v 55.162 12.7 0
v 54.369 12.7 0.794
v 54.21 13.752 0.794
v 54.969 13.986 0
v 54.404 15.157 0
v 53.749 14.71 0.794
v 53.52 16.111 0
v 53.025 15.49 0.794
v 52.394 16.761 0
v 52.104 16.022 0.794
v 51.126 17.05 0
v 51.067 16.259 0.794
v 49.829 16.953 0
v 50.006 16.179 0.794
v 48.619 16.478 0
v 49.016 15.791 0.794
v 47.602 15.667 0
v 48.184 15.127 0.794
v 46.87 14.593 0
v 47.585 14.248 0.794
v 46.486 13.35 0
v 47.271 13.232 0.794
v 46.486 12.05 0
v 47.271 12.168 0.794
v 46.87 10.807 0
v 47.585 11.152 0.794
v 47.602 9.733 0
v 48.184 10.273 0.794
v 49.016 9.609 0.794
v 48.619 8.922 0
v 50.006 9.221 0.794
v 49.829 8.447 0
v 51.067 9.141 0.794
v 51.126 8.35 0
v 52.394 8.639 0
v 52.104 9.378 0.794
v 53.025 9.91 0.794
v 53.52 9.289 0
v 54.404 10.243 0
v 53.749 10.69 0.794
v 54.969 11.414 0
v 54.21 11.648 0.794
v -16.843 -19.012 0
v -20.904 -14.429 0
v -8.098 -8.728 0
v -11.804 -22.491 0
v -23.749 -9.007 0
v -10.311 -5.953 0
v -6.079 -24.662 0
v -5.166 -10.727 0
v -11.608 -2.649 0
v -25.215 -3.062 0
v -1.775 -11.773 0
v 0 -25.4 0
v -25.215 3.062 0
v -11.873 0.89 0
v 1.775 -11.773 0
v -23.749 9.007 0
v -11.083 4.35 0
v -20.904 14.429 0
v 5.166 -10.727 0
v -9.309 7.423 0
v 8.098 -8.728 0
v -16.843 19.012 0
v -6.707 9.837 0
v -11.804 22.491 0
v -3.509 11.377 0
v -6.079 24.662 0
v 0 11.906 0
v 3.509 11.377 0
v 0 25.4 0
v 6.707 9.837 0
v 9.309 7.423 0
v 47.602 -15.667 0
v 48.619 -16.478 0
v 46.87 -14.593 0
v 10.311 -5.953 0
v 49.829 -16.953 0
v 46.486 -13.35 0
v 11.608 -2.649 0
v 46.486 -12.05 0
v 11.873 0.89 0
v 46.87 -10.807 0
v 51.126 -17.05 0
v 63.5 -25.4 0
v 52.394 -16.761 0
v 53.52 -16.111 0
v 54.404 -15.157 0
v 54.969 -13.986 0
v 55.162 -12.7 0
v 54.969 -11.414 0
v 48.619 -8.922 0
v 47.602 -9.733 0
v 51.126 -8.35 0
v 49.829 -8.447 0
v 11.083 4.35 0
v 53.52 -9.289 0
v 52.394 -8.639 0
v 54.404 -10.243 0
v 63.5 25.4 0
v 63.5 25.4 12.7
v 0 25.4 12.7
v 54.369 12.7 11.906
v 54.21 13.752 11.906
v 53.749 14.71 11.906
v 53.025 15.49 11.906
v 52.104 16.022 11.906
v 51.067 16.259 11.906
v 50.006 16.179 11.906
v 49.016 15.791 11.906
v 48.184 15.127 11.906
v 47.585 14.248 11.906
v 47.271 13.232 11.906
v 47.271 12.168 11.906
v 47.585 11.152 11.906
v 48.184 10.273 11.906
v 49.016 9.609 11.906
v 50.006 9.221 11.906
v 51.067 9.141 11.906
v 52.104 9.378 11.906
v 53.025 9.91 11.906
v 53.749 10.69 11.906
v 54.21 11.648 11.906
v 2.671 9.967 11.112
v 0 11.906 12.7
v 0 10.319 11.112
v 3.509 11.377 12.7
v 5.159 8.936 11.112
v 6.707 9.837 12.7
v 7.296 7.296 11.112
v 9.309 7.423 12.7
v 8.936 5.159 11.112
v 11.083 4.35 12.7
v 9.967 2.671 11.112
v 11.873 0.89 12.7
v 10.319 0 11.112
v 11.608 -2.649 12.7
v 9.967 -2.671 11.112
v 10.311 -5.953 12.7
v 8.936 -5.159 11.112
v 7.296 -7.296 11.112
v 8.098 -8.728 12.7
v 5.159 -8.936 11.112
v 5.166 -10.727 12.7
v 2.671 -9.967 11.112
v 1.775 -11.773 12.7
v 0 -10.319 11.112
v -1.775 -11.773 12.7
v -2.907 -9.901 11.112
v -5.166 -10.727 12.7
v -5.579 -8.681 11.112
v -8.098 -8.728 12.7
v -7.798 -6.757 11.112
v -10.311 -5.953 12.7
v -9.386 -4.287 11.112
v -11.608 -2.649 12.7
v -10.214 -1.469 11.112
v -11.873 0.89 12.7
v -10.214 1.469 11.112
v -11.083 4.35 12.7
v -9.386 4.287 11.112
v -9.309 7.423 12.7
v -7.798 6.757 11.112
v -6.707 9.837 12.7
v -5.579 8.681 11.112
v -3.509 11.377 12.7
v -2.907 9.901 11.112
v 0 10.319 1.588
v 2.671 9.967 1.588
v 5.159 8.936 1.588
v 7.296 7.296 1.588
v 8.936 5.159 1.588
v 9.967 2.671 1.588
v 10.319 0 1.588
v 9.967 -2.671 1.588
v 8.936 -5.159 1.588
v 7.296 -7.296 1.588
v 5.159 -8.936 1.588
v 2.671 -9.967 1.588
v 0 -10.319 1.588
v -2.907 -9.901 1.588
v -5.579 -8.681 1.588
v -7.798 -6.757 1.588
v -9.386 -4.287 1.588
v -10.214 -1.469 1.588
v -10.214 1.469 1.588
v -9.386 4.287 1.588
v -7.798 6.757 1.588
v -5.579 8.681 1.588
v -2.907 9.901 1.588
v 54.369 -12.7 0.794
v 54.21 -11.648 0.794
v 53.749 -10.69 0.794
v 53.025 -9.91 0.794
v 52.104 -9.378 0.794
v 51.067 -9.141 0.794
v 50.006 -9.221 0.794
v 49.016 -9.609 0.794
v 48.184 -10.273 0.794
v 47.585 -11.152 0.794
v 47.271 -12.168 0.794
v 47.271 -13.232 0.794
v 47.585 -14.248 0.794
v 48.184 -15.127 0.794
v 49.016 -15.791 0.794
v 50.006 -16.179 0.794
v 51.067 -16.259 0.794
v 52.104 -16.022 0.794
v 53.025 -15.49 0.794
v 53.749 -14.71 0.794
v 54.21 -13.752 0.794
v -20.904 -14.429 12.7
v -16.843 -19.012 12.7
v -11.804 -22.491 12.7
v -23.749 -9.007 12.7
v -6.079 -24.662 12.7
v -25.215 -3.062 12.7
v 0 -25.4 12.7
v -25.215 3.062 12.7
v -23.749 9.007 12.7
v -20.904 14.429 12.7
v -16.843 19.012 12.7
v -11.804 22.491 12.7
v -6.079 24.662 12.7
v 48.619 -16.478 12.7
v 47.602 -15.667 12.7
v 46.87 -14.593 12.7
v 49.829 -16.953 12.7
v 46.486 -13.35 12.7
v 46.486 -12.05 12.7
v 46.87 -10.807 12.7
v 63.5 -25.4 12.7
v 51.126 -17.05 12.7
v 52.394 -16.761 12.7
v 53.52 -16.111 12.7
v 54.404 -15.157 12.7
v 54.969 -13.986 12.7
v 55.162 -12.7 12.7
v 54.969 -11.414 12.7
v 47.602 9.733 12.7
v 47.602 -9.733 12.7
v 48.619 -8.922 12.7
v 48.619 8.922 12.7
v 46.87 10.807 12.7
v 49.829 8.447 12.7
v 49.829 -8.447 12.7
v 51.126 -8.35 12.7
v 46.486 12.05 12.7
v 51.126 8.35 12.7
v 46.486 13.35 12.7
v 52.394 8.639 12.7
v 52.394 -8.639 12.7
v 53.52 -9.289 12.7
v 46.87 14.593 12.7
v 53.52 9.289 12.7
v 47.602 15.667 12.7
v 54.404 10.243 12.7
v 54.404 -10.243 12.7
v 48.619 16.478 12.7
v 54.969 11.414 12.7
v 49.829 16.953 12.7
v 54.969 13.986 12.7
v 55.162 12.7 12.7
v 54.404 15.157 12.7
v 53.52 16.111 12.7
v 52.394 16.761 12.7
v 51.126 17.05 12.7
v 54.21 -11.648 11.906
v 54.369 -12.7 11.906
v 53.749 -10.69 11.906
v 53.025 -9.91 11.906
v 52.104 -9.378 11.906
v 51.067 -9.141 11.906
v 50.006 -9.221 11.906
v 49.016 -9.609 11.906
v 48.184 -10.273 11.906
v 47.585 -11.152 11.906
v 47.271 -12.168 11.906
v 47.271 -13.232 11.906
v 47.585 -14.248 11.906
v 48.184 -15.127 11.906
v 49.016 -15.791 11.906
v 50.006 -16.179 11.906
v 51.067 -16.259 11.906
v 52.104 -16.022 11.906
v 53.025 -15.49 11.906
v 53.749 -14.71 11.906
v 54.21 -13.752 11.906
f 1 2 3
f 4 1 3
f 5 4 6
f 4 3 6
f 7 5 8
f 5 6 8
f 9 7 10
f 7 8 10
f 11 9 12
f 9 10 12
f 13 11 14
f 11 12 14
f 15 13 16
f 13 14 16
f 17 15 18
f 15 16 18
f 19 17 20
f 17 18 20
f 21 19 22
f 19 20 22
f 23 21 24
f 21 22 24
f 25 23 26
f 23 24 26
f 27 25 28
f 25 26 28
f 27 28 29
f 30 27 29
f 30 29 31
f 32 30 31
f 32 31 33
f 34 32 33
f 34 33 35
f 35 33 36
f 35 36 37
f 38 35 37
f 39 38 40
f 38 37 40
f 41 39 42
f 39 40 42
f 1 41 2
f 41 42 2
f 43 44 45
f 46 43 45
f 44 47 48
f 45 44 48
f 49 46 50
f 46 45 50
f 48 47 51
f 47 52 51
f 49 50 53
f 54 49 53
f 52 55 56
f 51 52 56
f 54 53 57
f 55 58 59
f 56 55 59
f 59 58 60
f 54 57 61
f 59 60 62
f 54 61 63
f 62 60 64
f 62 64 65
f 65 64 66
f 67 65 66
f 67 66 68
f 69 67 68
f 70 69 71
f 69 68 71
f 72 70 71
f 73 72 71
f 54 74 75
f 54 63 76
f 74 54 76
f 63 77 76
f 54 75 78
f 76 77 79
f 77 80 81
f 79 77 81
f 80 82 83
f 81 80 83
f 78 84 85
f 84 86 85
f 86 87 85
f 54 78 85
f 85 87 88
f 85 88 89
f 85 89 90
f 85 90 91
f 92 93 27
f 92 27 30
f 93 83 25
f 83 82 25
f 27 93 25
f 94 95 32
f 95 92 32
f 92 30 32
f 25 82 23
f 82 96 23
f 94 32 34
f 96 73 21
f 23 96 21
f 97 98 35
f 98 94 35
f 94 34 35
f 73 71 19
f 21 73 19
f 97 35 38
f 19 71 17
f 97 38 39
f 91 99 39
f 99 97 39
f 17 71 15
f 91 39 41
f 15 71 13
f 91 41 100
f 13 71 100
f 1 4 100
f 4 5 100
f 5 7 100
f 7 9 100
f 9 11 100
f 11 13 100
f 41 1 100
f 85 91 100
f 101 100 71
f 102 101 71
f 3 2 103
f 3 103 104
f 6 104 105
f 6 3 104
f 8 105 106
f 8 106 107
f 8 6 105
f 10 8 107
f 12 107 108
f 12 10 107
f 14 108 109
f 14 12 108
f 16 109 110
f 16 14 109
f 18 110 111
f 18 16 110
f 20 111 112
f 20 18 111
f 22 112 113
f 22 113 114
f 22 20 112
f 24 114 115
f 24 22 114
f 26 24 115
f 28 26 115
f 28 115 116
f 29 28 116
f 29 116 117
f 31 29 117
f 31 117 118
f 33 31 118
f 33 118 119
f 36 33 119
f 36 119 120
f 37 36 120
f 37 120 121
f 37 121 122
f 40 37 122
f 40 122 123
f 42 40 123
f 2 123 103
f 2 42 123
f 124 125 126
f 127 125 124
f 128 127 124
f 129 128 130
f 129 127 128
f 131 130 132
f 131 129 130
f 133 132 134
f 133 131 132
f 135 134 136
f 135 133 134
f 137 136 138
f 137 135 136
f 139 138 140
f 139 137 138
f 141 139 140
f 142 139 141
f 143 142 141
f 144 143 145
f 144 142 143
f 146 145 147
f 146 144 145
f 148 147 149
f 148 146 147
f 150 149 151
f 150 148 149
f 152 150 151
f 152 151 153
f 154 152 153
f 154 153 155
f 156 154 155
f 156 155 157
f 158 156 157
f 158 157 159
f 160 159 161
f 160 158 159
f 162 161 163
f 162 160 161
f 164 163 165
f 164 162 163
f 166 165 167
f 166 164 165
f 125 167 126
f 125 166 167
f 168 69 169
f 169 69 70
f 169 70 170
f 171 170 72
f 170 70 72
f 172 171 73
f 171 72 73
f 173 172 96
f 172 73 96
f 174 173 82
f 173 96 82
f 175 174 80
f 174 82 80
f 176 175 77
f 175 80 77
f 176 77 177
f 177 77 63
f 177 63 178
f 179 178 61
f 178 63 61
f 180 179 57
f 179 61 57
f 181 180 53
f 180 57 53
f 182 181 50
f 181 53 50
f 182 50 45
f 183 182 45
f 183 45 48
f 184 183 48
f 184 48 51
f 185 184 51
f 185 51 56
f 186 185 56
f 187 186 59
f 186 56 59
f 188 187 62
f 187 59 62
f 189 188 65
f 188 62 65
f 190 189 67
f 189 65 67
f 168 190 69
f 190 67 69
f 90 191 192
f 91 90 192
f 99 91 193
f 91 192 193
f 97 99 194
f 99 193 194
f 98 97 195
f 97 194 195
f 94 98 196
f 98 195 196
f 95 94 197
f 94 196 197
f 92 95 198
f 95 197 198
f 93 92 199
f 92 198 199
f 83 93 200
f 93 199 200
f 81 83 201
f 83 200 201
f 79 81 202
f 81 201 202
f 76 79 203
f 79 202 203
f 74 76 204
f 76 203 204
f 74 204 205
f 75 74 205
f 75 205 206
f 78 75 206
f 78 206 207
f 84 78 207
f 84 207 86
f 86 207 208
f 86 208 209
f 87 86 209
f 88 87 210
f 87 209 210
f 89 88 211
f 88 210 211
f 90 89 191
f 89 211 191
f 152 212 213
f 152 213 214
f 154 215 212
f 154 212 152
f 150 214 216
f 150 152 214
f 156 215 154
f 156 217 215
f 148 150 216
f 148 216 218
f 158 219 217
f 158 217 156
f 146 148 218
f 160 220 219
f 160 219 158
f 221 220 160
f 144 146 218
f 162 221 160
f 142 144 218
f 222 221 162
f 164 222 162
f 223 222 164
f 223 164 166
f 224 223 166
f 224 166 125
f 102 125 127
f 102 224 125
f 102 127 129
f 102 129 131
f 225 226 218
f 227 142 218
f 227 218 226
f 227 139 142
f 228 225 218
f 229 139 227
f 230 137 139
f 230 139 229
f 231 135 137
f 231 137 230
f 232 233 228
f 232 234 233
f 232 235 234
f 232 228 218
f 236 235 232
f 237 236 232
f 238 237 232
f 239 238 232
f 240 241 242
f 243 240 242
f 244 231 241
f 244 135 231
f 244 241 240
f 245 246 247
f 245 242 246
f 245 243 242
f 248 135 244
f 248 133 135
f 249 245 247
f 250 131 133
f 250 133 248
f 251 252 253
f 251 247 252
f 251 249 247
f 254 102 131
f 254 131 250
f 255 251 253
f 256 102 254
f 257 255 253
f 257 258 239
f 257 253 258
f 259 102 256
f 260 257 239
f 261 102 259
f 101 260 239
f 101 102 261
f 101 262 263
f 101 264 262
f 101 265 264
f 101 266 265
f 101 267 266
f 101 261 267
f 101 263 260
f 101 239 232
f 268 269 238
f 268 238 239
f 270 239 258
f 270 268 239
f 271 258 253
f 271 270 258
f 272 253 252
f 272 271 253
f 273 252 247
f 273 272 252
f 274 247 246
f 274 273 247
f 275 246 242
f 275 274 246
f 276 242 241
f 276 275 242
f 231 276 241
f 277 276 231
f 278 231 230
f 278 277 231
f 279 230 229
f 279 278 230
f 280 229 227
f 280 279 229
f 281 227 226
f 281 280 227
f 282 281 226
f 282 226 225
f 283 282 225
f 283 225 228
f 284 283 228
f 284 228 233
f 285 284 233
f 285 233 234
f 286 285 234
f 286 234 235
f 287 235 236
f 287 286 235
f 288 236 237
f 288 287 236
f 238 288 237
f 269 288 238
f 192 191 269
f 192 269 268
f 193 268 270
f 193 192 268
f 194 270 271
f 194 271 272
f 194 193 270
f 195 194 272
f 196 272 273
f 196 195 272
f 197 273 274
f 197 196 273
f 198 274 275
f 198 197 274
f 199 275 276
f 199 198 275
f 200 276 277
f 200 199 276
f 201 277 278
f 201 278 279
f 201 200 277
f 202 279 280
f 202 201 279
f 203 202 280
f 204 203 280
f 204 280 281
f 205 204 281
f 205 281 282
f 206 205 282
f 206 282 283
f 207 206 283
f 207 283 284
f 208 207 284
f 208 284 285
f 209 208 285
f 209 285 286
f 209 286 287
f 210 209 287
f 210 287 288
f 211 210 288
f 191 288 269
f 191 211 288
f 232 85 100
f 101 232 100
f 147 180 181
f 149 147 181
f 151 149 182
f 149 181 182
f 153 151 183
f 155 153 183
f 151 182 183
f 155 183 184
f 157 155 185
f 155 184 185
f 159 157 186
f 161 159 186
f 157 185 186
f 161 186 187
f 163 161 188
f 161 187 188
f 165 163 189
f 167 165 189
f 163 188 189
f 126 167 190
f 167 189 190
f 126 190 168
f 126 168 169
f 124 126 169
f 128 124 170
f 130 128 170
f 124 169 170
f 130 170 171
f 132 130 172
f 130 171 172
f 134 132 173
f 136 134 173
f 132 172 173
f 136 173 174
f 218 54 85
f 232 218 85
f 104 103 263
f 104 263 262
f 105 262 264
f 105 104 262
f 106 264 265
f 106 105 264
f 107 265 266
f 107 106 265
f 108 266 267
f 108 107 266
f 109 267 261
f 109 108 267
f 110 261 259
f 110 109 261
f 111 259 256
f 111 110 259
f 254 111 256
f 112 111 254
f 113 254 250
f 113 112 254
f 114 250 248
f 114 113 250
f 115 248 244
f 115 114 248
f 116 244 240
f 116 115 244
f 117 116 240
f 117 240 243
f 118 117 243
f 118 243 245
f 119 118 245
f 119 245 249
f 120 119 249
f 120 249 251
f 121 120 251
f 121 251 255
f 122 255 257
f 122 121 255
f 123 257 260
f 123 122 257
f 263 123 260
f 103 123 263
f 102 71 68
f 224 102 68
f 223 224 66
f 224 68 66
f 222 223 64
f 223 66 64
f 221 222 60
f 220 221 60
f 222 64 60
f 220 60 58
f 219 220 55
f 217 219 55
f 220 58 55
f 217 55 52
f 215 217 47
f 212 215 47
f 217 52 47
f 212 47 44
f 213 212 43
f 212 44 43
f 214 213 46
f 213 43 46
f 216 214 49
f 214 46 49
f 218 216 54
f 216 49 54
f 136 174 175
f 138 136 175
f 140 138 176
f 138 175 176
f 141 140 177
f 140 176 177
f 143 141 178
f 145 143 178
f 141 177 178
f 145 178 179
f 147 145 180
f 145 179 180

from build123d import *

# Parameters (mm, degrees)
F0_R     = 3.5687
F1_DEPTH = 12.7
F3_SIZE  = 0.79375


# Not quite as in the source:
# - a fillet or chamfer that OpenCascade refuses, or shapes differently, is made with other operations: its cross-section is extruded or revolved along the edge and cut away or added


with BuildPart() as f1:
    # F0 (on Top) → F1 (new body)
    with BuildSketch(Plane.XY):
        with BuildLine():
            Line((0, 10.31875), (0, 25.4))
            ThreePointArc((0, 25.4), (-25.4, 0), (0, -25.4))
            Line((0, -25.4), (0, -10.31875))
            ThreePointArc((0, -10.31875), (-10.31875, 0), (0, 10.31875))
        make_face()
        with BuildLine():
            ThreePointArc((0, 25.4), (17.9605122421, 17.9605122421), (25.4, 0))
            ThreePointArc((25.4, 0), (17.9605122421, -17.9605122421), (0, -25.4))
            Line((0, -25.4), (63.5, -25.4))
            Line((63.5, -25.4), (63.5, 25.4))
            Line((63.5, 25.4), (0, 25.4))
        make_face()
        with Locations((50.8, -12.7)):
            Circle(F0_R, mode=Mode.SUBTRACT)
        with Locations((50.8, 12.7)):
            Circle(F0_R, mode=Mode.SUBTRACT)
        with BuildLine():
            ThreePointArc((0, -25.4), (17.9605122421, -17.9605122421), (25.4, 0))
            ThreePointArc((25.4, 0), (17.9605122421, 17.9605122421), (0, 25.4))
            Line((0, 25.4), (0, 10.31875))
            ThreePointArc((0, 10.31875), (7.2964580984, 7.2964580984), (10.31875, 0))
            ThreePointArc((10.31875, 0), (7.2964580984, -7.2964580984), (0, -10.31875))
            Line((0, -10.31875), (0, -25.4))
        make_face()
    extrude(amount=F1_DEPTH)

    # F2: chamfer of 1.5875 on 2 edges, made by hand

    # F2_s1 → F2_t2 (revolve, cut)
    with BuildSketch(Plane.YZ):
        Polygon((10.31875, 1.5875), (11.90625, 0), (10.31875, 0), align=None)
    revolve(axis=Axis((0, 0, 0), (0, 0, -1)), mode=Mode.SUBTRACT)

    # F2_s3 → F2_t4 (revolve, cut)
    with BuildSketch(Plane.YZ):
        Polygon((10.31875, 11.1125), (11.90625, 12.7), (10.31875, 12.7), align=None)
    revolve(axis=Axis((0, 0, 12.7), (0, 0, -1)), mode=Mode.SUBTRACT)

    # F3
    f3_edges = [f1.edges().sort_by_distance(p)[0] for p in [
        (47.2313, -12.7, 0),
        (47.2313, 12.7, 0),
        (47.2313, -12.7, 12.7),
        (47.2313, 12.7, 12.7),
    ]]
    chamfer(f3_edges, length=F3_SIZE)


solid = f1.part
